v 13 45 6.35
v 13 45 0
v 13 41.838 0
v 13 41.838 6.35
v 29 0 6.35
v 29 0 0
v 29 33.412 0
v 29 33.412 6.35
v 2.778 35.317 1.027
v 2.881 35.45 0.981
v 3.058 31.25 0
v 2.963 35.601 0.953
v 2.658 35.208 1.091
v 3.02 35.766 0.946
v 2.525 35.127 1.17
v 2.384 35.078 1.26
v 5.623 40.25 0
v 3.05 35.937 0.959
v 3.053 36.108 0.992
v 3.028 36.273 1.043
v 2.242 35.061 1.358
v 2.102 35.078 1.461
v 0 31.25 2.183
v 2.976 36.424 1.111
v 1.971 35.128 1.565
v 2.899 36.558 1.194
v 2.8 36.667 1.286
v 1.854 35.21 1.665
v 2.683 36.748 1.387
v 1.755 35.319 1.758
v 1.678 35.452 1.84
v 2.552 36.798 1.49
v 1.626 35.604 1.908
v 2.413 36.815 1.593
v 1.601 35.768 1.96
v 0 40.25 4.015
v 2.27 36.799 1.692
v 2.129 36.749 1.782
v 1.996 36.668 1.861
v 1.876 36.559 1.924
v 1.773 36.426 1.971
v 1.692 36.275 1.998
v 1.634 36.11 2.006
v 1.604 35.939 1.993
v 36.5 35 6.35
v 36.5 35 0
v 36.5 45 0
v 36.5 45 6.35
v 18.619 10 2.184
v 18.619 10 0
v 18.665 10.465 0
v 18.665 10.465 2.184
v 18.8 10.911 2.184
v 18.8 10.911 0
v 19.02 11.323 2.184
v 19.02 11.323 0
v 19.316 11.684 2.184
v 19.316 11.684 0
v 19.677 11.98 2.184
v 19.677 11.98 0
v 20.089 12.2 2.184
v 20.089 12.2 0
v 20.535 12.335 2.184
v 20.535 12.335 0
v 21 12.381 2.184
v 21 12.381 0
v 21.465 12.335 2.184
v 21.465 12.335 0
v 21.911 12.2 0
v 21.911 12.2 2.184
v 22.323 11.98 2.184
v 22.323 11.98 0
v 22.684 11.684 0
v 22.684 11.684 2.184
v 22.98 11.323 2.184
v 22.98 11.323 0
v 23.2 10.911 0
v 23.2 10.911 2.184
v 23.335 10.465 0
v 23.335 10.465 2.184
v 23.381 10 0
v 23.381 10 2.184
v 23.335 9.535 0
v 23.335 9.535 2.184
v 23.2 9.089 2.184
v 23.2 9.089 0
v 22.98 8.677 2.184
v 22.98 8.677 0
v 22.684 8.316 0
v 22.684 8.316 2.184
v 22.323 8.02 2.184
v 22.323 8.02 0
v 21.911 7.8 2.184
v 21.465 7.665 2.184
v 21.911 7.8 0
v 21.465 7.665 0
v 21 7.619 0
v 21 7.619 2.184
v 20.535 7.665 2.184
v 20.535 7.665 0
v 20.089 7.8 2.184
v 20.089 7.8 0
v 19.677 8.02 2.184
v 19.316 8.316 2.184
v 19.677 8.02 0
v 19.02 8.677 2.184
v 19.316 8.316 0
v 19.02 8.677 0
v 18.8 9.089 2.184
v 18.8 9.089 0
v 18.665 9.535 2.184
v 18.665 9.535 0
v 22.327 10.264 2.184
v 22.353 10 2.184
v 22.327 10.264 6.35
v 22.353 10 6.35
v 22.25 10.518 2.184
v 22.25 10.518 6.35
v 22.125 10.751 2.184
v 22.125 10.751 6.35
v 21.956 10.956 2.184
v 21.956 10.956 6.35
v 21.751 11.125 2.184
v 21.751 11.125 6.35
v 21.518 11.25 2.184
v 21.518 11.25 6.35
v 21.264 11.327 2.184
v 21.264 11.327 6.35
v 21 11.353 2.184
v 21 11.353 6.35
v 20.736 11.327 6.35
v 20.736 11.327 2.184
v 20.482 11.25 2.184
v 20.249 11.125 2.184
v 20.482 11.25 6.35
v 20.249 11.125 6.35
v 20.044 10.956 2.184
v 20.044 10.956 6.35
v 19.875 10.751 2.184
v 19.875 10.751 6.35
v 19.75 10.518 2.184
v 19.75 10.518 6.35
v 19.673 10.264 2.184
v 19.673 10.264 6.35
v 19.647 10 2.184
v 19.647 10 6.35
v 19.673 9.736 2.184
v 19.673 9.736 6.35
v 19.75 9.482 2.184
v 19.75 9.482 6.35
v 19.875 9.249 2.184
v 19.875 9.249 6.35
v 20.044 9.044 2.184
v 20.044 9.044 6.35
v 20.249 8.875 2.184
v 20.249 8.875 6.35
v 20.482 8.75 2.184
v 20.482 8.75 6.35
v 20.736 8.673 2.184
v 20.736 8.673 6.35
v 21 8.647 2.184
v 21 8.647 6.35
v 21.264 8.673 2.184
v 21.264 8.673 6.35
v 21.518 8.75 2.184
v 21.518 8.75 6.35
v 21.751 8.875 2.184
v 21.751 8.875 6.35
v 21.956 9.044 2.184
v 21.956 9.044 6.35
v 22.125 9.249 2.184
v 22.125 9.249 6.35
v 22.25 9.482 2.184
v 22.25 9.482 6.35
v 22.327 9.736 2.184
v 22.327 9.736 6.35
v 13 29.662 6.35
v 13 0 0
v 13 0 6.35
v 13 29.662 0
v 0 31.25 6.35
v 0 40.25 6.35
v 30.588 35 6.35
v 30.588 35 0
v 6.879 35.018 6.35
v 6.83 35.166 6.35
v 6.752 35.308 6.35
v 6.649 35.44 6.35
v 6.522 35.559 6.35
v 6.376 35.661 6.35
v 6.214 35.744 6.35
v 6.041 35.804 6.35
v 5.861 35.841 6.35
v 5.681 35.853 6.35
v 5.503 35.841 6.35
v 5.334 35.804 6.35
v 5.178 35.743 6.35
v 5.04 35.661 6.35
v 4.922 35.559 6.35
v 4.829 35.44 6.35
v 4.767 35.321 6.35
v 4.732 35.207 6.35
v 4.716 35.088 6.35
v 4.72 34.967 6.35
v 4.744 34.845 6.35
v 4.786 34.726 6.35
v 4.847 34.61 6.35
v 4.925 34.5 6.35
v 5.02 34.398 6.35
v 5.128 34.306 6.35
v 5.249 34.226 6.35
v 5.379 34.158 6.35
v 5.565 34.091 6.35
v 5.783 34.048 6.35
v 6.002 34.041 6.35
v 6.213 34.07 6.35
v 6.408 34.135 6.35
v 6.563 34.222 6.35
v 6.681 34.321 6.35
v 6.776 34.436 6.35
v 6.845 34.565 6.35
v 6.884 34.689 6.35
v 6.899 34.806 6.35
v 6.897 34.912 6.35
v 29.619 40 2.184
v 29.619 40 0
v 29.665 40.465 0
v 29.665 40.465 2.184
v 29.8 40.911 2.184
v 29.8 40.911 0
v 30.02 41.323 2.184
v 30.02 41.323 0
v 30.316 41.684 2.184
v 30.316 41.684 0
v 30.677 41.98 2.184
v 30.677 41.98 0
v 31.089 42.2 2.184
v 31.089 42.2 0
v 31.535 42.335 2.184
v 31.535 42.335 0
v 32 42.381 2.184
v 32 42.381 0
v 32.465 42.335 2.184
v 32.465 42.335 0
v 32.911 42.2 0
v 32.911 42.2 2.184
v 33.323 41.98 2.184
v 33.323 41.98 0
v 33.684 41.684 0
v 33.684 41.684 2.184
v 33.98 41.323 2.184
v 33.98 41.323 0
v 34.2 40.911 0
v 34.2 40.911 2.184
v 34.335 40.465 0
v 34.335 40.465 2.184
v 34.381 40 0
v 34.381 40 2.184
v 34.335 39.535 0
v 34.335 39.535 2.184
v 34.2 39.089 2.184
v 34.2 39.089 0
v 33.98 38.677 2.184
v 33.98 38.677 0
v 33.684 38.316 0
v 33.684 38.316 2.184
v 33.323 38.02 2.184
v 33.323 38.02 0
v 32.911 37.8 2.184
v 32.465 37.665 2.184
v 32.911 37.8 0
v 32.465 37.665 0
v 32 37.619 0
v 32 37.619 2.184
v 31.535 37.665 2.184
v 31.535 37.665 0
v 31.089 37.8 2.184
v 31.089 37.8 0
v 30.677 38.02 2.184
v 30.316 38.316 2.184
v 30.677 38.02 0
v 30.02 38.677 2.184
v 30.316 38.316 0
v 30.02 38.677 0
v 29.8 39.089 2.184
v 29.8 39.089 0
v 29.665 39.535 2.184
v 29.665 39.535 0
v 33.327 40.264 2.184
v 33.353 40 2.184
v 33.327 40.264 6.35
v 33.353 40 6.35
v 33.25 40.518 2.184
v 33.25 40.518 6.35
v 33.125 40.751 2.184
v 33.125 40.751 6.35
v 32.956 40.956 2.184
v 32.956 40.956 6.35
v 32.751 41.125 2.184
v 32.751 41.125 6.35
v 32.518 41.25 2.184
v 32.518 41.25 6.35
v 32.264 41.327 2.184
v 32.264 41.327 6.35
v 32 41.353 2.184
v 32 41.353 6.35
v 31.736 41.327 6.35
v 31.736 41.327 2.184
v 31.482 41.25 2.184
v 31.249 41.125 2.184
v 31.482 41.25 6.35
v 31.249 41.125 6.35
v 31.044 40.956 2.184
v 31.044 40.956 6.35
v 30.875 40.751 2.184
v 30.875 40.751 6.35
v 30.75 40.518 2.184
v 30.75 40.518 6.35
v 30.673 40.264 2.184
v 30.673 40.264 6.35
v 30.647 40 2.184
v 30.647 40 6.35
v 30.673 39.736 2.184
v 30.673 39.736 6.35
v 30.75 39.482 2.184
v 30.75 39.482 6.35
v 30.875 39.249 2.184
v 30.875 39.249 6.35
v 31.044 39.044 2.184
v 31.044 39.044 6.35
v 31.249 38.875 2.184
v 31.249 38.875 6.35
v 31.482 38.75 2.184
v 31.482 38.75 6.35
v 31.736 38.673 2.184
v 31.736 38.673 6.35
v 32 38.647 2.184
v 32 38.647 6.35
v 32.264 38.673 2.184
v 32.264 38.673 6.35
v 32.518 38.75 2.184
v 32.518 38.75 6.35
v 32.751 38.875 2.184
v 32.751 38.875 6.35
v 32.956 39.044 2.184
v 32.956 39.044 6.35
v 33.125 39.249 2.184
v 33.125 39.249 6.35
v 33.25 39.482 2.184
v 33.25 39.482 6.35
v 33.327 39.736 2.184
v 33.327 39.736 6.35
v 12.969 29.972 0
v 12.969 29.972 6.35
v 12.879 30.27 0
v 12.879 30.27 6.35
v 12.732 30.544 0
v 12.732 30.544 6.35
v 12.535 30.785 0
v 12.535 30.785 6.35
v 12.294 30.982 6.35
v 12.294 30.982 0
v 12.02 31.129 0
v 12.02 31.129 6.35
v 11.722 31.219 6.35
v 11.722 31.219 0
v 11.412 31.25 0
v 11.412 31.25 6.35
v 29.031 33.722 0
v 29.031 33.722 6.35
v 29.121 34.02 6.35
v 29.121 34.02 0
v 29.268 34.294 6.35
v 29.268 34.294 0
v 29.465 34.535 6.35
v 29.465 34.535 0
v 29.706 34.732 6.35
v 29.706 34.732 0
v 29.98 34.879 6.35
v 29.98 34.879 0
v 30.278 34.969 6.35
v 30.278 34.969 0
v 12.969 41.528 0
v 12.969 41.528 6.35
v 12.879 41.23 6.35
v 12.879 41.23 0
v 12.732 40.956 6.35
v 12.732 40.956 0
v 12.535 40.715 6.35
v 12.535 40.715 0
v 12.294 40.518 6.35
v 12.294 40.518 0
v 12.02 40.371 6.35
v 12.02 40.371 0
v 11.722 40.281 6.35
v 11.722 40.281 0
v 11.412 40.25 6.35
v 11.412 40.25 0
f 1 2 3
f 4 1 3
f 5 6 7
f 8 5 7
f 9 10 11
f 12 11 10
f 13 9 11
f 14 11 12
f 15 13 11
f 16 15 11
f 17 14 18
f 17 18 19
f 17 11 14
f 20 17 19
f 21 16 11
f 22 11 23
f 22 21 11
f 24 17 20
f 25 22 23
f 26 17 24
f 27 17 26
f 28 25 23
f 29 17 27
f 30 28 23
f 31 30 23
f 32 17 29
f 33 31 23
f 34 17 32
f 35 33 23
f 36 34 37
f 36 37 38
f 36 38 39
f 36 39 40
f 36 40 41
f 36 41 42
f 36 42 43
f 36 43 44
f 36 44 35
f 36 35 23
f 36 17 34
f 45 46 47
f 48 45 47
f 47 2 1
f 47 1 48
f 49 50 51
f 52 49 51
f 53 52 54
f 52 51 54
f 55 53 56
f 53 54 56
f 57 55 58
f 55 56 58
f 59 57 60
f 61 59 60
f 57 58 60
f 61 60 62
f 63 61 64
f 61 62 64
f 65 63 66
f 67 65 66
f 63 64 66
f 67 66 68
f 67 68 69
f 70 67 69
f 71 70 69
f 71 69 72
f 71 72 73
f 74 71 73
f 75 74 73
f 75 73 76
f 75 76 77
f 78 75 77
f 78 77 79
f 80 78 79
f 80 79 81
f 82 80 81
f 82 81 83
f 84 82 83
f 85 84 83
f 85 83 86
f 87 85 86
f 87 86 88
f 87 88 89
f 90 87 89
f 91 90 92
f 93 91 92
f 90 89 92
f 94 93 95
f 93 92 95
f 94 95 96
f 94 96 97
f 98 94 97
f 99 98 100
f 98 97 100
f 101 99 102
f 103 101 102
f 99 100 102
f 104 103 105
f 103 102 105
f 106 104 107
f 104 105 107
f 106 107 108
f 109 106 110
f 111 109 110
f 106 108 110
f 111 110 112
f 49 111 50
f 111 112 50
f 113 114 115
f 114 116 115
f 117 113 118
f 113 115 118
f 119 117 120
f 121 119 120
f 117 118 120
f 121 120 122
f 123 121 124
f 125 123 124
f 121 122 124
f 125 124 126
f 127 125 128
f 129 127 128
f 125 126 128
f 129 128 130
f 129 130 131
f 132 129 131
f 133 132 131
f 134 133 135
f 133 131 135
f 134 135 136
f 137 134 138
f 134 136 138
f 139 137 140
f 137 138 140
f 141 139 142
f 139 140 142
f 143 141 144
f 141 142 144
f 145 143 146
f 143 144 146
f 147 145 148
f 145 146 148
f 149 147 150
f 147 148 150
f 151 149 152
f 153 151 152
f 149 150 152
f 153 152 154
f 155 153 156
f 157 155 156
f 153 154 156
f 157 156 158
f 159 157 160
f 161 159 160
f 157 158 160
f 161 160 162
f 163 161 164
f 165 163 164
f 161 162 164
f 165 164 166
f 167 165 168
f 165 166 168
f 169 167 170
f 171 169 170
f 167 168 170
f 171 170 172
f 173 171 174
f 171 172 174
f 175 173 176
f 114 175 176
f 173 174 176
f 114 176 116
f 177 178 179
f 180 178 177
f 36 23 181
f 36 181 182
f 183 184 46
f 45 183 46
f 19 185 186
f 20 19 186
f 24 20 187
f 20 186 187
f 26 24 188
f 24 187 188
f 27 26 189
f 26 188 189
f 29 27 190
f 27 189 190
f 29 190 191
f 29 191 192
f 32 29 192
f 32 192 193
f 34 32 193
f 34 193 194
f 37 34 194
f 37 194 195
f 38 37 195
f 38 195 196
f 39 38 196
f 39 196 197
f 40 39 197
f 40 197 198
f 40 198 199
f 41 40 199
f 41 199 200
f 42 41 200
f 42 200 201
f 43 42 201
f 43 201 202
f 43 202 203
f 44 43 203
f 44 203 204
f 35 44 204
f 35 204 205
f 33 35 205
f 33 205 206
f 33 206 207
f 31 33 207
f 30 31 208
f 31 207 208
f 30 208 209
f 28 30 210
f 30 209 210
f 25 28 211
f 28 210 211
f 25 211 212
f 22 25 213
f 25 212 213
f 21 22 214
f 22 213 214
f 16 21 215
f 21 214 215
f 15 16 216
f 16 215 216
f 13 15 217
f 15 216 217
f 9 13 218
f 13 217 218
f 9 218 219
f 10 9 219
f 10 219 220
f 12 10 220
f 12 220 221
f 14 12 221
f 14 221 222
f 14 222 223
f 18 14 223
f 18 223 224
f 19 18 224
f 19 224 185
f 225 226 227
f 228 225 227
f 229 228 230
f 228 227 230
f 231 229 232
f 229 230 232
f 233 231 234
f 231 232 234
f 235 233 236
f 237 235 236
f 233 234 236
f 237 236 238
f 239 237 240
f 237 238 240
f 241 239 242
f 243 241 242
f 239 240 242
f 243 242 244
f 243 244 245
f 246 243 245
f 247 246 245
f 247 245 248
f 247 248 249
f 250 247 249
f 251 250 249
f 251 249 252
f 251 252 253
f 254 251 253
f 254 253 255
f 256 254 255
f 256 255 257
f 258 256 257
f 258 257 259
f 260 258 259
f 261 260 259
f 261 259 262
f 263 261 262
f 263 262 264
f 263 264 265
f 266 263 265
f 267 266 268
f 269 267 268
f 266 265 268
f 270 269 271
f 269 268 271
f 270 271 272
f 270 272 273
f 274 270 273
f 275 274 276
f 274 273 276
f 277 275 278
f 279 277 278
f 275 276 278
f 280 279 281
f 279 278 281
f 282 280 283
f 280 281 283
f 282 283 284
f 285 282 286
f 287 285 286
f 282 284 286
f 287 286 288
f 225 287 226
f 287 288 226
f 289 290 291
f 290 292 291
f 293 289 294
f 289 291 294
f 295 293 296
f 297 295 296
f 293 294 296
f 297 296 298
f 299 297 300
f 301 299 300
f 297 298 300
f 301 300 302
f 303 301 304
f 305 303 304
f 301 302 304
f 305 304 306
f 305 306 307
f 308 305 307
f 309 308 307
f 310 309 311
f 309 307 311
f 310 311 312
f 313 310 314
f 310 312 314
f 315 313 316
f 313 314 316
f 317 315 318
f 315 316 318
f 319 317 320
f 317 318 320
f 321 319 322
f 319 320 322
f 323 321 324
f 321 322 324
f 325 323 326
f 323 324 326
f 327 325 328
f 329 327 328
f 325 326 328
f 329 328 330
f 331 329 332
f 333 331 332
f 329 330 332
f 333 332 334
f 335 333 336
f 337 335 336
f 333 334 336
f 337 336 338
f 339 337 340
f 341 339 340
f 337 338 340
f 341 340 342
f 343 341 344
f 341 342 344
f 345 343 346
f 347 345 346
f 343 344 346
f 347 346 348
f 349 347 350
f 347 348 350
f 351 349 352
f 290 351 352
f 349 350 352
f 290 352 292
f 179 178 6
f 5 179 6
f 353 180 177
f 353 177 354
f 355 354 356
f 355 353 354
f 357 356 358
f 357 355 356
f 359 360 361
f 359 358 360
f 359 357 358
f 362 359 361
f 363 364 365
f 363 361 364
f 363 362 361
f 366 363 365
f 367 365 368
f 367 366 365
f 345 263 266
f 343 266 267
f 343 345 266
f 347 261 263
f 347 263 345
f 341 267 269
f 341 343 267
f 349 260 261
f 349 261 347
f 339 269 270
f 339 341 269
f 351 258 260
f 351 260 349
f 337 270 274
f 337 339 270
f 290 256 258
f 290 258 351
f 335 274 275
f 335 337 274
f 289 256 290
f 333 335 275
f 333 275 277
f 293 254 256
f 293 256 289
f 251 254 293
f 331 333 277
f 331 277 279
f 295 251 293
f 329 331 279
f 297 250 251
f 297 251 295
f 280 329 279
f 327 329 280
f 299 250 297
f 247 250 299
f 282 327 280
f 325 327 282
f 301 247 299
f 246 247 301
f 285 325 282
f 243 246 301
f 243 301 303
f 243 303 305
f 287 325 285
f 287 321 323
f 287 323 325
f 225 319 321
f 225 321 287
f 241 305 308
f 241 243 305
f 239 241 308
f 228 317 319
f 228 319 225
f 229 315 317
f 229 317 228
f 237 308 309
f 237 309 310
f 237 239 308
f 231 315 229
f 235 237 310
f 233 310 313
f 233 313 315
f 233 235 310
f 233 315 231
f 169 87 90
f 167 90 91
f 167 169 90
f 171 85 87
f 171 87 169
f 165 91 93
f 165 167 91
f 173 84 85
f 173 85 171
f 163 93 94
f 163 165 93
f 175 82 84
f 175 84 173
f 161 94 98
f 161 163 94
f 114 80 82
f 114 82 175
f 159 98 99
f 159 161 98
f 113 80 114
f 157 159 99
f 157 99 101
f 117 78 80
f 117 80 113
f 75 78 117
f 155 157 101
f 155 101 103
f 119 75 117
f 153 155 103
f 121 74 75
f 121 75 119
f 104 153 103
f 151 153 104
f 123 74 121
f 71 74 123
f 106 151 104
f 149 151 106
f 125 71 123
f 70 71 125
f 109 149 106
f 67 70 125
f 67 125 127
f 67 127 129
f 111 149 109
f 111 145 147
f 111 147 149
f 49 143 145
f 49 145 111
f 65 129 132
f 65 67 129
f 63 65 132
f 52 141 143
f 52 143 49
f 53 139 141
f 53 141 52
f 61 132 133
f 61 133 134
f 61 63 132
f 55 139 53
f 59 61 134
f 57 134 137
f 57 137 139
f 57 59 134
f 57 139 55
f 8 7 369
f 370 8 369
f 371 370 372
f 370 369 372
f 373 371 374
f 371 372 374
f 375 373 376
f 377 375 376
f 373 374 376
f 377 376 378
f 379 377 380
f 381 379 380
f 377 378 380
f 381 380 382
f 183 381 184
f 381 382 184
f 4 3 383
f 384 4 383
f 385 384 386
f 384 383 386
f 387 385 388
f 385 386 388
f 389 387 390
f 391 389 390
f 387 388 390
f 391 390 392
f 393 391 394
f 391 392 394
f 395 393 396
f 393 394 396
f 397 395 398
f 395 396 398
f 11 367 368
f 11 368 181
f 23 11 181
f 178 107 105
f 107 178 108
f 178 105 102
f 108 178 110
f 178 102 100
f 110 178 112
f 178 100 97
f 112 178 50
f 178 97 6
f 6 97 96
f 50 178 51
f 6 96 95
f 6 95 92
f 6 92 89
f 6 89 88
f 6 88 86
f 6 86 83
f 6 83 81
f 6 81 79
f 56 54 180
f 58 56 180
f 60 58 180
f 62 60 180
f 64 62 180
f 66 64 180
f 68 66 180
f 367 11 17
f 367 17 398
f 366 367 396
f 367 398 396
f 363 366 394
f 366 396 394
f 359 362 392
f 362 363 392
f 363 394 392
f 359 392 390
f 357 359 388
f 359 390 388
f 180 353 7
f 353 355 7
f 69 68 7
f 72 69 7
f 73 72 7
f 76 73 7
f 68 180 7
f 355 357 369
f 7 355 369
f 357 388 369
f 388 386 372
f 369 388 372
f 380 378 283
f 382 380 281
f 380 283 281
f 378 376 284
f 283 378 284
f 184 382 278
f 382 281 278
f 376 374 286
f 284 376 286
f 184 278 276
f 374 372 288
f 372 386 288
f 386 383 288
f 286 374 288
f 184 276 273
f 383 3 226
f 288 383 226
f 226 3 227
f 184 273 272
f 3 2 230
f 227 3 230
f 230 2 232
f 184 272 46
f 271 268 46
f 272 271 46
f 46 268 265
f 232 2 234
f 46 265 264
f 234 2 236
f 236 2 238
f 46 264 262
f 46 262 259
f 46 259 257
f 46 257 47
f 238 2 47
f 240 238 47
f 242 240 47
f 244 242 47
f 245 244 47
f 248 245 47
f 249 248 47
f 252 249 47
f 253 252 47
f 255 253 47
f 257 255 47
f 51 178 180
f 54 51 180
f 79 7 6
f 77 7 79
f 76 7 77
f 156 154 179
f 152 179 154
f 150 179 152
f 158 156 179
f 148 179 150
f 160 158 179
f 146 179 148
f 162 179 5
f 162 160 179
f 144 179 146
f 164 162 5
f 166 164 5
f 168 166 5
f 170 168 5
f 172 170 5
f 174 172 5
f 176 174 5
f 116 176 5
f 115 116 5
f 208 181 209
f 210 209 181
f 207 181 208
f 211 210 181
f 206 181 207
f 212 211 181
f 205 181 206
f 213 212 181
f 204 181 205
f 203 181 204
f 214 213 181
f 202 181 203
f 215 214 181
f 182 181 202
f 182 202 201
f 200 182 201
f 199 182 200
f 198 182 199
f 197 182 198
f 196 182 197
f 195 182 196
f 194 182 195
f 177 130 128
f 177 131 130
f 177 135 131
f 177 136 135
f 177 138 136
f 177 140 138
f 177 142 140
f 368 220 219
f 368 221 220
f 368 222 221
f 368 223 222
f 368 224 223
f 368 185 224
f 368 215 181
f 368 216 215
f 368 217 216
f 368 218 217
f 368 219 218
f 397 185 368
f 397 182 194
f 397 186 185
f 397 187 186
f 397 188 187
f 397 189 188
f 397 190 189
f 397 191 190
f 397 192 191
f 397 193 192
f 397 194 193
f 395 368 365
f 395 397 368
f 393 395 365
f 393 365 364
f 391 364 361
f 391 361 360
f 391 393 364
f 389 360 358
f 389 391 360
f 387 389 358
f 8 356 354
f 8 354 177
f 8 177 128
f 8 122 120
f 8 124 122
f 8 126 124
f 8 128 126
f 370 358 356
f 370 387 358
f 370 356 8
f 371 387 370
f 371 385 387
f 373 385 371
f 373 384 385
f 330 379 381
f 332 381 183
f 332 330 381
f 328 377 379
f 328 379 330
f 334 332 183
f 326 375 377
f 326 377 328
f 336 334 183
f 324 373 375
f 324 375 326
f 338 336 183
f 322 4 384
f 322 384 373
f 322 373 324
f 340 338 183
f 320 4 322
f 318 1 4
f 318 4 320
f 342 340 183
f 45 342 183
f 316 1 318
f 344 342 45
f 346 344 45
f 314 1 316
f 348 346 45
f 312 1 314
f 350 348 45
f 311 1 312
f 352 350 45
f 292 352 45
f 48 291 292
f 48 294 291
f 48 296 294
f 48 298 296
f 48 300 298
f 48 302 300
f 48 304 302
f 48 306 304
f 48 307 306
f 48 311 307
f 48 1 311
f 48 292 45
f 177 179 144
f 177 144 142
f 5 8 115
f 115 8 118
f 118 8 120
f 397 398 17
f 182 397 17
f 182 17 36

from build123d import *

# Parameters (mm, degrees)
SKETCH1_W                                      = 36.5
SKETCH1_H                                      = 45
BOSS_EXTRUDE1_DEPTH                            = 6.35
SKETCH4_W                                      = 50
SKETCH4_H                                      = 50
CUT_EXTRUDE1_DEPTH                             = 4
CUT_EXTRUDE2_DEPTH                             = 19
F_2_56_TAPPED_HOLE1_D                          = 1.778
CBORE_FOR_2_SOCKET_HEAD_CAP_SCREW1_D           = 2.7051
CBORE_FOR_2_SOCKET_HEAD_CAP_SCREW1_CBORE_D     = 4.7625
CBORE_FOR_2_SOCKET_HEAD_CAP_SCREW1_CBORE_DEPTH = 2.18439746


with BuildPart() as part:
    # Sketch1 → Boss-Extrude1 (new body)
    with BuildSketch(Plane.XY):
        with Locations((18.25, 22.5)):
            Rectangle(SKETCH1_W, SKETCH1_H)
    extrude(amount=BOSS_EXTRUDE1_DEPTH)

    # Sketch4 → Cut-Extrude1 (cut)
    with BuildSketch(Plane(origin=(-4.216220414, 1.201768304, -5.904135163), x_dir=(-0.816779309, -0.191151006, 0.544364633), z_dir=(-0.573332653, 0.16341959, -0.802859705))):
        with Locations((-8.601795261, 43.553754656)):
            Rectangle(SKETCH4_W, SKETCH4_H)
    extrude(amount=-CUT_EXTRUDE1_DEPTH, mode=Mode.SUBTRACT)

    # Sketch7 → Cut-Extrude2 (cut)
    with BuildSketch(Plane(origin=(0, 0, 0), x_dir=(-1, 0, 0), z_dir=(0, 0, -1))):
        with BuildLine():
            Line((0, 0), (-13, 0))
            Line((-13, 0), (-13, 29.6625))
            ThreePointArc((-13, 29.6625), (-12.535032015, 30.785032015), (-11.4125, 31.25))
            Line((-11.4125, 31.25), (0, 31.25))
            Line((0, 31.25), (0, 0))
        make_face()
        with BuildLine():
            Line((-36.5, 0), (-29, 0))
            Line((-29, 0), (-29, 33.4125))
            ThreePointArc((-29, 33.4125), (-29.464967985, 34.535032015), (-30.5875, 35))
            Line((-30.5875, 35), (-36.5, 35))
            Line((-36.5, 35), (-36.5, 0))
        make_face()
        with BuildLine():
            Line((-13, 45), (-13, 41.8375))
            ThreePointArc((-13, 41.8375), (-12.535032015, 40.714967985), (-11.4125, 40.25))
            Line((-11.4125, 40.25), (0, 40.25))
            Line((0, 40.25), (0, 45))
            Line((0, 45), (-13, 45))
        make_face()
    extrude(amount=-CUT_EXTRUDE2_DEPTH, mode=Mode.SUBTRACT)

    # #2-56 Tapped Hole1 (through all)
    with Locations(Plane(origin=(-1.9228898, 0.548089945, -2.692696342), x_dir=(-0.816779309, -0.191151006, 0.544364633), z_dir=(-0.573332653, 0.16341959, -0.802859705))):
        with Locations((-7.966944936, 34.99181106)):
            Hole(F_2_56_TAPPED_HOLE1_D / 2)

    # CBORE for #2 Socket Head Cap Screw1 (through all)
    with Locations(Plane(origin=(0, 0, 0), x_dir=(-1, 0, 0), z_dir=(0, 0, -1))):
        with Locations((-21, 10), (-32, 40)):
            CounterBoreHole(CBORE_FOR_2_SOCKET_HEAD_CAP_SCREW1_D / 2, CBORE_FOR_2_SOCKET_HEAD_CAP_SCREW1_CBORE_D / 2, CBORE_FOR_2_SOCKET_HEAD_CAP_SCREW1_CBORE_DEPTH)


solid = part.part
